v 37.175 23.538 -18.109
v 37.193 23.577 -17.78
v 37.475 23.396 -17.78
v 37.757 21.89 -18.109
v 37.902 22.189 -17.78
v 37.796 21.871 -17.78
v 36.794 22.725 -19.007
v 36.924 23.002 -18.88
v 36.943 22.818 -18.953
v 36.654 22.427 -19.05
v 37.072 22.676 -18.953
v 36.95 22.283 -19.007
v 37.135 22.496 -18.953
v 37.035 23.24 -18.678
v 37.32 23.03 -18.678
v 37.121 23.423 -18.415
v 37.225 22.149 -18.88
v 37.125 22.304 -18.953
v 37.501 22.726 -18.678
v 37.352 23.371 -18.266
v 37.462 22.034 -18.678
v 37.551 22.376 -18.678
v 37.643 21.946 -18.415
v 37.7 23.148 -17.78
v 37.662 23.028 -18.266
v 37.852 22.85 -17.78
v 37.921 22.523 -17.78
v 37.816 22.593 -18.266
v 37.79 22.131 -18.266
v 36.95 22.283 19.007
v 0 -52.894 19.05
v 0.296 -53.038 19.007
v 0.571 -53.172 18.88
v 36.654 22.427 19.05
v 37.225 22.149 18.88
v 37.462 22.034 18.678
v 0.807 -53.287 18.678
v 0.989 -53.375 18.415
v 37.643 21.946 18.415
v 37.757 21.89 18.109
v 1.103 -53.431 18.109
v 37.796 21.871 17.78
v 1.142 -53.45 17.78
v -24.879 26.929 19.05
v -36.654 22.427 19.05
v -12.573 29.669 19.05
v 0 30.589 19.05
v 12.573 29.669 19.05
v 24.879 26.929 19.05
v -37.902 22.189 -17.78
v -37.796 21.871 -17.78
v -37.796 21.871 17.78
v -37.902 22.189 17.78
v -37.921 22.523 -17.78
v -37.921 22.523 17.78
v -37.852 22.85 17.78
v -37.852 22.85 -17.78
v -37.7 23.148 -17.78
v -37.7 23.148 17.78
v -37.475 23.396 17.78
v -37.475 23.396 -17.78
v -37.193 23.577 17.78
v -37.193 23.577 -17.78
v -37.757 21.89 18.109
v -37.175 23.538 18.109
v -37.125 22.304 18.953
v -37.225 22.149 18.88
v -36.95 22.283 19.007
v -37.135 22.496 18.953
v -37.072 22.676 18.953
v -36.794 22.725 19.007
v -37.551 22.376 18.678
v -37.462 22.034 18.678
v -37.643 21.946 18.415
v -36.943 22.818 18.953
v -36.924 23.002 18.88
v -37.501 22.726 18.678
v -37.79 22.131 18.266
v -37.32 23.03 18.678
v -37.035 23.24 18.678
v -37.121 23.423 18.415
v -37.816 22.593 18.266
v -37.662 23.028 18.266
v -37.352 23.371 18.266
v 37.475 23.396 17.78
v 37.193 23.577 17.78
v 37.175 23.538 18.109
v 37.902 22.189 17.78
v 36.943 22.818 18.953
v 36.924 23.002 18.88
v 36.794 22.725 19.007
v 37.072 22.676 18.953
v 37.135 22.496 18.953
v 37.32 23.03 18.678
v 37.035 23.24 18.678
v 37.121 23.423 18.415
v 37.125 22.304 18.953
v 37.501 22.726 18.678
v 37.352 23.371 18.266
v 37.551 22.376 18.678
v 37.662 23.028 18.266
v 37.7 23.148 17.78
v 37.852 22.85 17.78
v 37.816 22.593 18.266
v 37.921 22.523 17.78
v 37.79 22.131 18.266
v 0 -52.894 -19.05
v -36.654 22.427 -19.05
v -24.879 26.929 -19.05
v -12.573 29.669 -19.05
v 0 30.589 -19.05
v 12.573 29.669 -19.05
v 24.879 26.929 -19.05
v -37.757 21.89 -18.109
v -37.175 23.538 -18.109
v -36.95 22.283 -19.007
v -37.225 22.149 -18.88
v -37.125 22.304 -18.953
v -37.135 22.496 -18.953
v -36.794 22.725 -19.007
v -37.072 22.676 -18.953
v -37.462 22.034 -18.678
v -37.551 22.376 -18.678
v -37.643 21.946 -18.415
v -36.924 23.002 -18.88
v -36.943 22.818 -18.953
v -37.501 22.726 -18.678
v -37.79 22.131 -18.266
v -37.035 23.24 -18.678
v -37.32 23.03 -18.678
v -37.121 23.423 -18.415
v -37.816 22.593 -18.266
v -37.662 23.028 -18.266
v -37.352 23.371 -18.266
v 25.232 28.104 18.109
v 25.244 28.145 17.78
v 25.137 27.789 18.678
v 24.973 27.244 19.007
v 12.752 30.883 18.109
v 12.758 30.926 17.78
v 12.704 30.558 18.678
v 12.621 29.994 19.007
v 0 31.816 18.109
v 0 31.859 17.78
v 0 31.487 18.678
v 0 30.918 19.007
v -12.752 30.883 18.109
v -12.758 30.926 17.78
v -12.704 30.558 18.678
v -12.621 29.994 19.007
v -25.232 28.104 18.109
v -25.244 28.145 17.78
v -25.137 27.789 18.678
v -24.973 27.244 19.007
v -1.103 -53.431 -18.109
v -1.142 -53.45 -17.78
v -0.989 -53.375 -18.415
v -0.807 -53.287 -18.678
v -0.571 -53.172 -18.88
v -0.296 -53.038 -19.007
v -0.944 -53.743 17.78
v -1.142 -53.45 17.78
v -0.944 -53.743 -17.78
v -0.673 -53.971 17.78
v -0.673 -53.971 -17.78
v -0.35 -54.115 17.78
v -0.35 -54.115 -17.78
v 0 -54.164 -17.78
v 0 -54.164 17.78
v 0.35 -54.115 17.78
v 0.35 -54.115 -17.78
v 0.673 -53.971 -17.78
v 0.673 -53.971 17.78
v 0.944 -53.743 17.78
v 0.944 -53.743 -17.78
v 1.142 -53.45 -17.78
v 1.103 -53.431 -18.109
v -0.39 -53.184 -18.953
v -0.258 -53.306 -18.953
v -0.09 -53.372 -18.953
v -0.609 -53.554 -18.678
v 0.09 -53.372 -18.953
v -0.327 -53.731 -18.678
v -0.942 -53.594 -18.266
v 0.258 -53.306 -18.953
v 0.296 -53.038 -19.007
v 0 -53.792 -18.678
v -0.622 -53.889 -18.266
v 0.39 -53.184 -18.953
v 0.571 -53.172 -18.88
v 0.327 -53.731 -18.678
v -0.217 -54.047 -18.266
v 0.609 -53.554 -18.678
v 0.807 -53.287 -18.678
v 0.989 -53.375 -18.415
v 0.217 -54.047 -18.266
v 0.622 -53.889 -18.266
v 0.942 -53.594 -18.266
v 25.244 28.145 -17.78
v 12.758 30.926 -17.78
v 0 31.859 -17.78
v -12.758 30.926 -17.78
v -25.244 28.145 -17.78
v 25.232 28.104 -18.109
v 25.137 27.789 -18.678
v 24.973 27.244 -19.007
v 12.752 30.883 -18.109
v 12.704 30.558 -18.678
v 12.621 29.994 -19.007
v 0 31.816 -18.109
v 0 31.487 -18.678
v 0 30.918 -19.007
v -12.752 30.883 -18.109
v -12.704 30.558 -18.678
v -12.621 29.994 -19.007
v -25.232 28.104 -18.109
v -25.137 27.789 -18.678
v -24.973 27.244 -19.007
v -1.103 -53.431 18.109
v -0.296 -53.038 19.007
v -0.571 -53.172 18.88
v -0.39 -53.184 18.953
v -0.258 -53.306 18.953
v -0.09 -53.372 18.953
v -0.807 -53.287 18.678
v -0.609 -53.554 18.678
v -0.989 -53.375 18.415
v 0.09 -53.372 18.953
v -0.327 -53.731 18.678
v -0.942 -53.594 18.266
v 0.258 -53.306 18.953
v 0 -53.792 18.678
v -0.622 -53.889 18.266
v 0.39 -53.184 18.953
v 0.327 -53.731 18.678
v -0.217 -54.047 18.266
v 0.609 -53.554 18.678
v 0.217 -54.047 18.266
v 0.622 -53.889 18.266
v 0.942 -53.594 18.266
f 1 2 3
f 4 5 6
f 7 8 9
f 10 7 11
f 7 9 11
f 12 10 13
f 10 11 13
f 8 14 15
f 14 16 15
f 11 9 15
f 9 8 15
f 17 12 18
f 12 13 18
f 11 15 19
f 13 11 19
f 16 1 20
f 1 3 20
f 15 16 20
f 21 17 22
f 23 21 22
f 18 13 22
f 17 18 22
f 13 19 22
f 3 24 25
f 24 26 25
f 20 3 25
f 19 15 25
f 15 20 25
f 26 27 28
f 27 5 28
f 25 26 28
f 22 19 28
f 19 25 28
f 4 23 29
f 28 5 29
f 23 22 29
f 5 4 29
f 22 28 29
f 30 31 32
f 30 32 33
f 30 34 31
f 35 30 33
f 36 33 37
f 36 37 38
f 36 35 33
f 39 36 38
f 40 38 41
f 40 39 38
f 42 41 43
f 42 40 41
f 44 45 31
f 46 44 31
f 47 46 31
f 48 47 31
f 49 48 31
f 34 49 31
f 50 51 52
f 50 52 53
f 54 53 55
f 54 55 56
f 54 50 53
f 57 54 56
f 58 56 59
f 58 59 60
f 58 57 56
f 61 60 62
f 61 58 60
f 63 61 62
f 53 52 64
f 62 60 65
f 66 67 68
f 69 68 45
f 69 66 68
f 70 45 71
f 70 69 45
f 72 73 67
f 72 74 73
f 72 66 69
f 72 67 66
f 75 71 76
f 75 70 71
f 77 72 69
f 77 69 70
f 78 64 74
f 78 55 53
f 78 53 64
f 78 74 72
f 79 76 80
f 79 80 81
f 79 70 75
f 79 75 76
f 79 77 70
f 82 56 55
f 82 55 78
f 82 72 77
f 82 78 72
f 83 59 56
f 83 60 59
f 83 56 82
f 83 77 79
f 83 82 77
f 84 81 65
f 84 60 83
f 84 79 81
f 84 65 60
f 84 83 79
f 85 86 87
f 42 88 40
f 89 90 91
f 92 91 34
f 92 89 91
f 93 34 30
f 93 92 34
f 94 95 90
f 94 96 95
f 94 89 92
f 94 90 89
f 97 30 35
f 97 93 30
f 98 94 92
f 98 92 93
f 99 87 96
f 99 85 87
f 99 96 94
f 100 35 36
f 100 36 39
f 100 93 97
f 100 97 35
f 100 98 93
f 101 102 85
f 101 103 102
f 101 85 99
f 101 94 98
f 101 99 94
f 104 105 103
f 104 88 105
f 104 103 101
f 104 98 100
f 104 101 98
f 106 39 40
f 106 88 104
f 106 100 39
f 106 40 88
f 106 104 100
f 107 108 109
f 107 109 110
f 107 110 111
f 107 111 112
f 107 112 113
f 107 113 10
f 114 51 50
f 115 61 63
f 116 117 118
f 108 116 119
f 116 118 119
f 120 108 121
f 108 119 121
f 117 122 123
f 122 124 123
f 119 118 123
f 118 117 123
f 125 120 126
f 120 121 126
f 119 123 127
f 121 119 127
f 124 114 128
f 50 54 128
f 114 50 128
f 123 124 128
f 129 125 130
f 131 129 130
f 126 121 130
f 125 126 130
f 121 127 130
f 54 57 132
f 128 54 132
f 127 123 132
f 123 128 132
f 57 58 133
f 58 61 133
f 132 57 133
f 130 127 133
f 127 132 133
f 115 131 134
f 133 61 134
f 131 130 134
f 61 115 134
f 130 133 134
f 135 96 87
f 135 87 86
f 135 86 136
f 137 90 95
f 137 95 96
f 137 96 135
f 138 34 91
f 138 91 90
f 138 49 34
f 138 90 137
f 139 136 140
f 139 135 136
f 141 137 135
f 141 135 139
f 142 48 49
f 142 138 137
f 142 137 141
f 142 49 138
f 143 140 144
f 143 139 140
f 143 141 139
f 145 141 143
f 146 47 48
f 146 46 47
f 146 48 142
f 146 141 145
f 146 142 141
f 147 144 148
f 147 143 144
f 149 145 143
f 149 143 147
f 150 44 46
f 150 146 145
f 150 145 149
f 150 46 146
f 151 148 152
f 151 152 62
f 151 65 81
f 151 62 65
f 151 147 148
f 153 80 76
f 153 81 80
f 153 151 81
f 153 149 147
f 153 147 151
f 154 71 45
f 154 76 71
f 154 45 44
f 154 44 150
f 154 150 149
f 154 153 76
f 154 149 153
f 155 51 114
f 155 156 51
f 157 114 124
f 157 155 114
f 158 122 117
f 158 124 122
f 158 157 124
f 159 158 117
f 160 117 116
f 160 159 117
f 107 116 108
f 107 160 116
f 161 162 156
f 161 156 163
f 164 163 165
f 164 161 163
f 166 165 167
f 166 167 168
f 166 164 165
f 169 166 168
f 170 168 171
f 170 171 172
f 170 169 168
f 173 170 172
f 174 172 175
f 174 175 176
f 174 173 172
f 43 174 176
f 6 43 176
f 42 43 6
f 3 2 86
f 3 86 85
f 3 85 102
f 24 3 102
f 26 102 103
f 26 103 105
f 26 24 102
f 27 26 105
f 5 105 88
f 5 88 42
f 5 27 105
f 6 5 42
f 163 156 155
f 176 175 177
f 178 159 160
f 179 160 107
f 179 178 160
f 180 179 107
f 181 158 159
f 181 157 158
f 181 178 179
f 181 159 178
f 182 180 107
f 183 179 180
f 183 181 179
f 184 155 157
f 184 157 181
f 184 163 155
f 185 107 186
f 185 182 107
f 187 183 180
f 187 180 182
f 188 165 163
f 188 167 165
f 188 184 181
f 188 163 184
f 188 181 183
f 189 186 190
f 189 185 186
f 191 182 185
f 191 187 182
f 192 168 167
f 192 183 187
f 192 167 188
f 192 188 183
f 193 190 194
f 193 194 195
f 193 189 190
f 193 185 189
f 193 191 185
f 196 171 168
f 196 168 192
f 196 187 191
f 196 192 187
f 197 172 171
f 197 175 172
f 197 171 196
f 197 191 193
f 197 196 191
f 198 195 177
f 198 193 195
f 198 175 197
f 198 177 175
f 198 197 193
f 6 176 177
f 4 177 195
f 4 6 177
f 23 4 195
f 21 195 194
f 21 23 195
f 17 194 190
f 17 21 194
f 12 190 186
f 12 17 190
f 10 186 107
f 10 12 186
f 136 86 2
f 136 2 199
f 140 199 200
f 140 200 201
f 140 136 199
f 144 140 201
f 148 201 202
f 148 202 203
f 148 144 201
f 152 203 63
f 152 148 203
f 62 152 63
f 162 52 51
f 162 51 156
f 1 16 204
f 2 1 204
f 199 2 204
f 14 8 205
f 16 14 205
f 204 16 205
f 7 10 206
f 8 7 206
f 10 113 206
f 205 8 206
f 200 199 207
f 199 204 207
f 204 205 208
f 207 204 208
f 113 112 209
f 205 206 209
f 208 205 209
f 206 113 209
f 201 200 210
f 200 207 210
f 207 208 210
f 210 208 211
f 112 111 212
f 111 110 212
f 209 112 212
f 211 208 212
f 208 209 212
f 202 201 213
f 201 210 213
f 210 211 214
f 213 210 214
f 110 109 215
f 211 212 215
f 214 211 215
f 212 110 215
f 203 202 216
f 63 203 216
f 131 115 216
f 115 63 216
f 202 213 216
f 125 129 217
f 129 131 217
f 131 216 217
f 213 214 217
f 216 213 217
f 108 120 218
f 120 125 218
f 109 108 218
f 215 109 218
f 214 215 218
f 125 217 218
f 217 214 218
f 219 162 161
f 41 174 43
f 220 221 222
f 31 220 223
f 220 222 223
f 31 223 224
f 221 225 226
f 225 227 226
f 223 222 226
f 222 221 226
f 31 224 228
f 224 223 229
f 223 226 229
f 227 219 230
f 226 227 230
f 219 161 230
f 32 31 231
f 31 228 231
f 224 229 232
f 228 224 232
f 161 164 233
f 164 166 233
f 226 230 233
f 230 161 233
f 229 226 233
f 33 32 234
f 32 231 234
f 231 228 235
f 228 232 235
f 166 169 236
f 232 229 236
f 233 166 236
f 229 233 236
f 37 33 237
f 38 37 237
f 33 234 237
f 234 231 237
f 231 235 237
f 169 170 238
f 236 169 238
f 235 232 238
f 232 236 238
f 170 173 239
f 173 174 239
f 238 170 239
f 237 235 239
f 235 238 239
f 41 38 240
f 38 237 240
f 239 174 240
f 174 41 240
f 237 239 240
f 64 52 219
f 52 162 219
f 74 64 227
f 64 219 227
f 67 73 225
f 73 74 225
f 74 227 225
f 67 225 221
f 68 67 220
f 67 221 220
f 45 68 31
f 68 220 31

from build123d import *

# Parameters (mm, degrees)
F1_DEPTH = 19.05
F3_R     = 1.27


# Not quite as in the source:
# - a feature of the source that left no trace in its solid (it failed there, or was rolled back) is left out


with BuildPart() as f1:
    # F0 (on Top) → F1 (new body, symmetric)
    with BuildSketch(Plane.XY):
        with BuildLine():
            Line((-38.3560955603, 23.021564283), (0, -55.7964481413))
            Line((0, -55.7964481413), (38.3560955603, 23.021564283))
            ThreePointArc((38.3560955603, 23.021564283), (0, 31.8589518587), (-38.3560955603, 23.021564283))
        make_face()
    extrude(amount=F1_DEPTH, both=True)

    # F3
    f3_edges = [f1.edges().sort_by_distance(p)[0] for p in [
        (0, -55.796448, 0),
        (38.356096, 23.021564, 0),
        (-38.356096, 23.021564, 0),
        (-19.178048, -16.387442, -19.05),
        (-19.178048, -16.387442, 19.05),
        (0, 31.858952, -19.05),
        (0, 31.858952, 19.05),
        (19.178048, -16.387442, 19.05),
        (19.178048, -16.387442, -19.05),
    ]]
    fillet(f3_edges, radius=F3_R)


solid = f1.part
